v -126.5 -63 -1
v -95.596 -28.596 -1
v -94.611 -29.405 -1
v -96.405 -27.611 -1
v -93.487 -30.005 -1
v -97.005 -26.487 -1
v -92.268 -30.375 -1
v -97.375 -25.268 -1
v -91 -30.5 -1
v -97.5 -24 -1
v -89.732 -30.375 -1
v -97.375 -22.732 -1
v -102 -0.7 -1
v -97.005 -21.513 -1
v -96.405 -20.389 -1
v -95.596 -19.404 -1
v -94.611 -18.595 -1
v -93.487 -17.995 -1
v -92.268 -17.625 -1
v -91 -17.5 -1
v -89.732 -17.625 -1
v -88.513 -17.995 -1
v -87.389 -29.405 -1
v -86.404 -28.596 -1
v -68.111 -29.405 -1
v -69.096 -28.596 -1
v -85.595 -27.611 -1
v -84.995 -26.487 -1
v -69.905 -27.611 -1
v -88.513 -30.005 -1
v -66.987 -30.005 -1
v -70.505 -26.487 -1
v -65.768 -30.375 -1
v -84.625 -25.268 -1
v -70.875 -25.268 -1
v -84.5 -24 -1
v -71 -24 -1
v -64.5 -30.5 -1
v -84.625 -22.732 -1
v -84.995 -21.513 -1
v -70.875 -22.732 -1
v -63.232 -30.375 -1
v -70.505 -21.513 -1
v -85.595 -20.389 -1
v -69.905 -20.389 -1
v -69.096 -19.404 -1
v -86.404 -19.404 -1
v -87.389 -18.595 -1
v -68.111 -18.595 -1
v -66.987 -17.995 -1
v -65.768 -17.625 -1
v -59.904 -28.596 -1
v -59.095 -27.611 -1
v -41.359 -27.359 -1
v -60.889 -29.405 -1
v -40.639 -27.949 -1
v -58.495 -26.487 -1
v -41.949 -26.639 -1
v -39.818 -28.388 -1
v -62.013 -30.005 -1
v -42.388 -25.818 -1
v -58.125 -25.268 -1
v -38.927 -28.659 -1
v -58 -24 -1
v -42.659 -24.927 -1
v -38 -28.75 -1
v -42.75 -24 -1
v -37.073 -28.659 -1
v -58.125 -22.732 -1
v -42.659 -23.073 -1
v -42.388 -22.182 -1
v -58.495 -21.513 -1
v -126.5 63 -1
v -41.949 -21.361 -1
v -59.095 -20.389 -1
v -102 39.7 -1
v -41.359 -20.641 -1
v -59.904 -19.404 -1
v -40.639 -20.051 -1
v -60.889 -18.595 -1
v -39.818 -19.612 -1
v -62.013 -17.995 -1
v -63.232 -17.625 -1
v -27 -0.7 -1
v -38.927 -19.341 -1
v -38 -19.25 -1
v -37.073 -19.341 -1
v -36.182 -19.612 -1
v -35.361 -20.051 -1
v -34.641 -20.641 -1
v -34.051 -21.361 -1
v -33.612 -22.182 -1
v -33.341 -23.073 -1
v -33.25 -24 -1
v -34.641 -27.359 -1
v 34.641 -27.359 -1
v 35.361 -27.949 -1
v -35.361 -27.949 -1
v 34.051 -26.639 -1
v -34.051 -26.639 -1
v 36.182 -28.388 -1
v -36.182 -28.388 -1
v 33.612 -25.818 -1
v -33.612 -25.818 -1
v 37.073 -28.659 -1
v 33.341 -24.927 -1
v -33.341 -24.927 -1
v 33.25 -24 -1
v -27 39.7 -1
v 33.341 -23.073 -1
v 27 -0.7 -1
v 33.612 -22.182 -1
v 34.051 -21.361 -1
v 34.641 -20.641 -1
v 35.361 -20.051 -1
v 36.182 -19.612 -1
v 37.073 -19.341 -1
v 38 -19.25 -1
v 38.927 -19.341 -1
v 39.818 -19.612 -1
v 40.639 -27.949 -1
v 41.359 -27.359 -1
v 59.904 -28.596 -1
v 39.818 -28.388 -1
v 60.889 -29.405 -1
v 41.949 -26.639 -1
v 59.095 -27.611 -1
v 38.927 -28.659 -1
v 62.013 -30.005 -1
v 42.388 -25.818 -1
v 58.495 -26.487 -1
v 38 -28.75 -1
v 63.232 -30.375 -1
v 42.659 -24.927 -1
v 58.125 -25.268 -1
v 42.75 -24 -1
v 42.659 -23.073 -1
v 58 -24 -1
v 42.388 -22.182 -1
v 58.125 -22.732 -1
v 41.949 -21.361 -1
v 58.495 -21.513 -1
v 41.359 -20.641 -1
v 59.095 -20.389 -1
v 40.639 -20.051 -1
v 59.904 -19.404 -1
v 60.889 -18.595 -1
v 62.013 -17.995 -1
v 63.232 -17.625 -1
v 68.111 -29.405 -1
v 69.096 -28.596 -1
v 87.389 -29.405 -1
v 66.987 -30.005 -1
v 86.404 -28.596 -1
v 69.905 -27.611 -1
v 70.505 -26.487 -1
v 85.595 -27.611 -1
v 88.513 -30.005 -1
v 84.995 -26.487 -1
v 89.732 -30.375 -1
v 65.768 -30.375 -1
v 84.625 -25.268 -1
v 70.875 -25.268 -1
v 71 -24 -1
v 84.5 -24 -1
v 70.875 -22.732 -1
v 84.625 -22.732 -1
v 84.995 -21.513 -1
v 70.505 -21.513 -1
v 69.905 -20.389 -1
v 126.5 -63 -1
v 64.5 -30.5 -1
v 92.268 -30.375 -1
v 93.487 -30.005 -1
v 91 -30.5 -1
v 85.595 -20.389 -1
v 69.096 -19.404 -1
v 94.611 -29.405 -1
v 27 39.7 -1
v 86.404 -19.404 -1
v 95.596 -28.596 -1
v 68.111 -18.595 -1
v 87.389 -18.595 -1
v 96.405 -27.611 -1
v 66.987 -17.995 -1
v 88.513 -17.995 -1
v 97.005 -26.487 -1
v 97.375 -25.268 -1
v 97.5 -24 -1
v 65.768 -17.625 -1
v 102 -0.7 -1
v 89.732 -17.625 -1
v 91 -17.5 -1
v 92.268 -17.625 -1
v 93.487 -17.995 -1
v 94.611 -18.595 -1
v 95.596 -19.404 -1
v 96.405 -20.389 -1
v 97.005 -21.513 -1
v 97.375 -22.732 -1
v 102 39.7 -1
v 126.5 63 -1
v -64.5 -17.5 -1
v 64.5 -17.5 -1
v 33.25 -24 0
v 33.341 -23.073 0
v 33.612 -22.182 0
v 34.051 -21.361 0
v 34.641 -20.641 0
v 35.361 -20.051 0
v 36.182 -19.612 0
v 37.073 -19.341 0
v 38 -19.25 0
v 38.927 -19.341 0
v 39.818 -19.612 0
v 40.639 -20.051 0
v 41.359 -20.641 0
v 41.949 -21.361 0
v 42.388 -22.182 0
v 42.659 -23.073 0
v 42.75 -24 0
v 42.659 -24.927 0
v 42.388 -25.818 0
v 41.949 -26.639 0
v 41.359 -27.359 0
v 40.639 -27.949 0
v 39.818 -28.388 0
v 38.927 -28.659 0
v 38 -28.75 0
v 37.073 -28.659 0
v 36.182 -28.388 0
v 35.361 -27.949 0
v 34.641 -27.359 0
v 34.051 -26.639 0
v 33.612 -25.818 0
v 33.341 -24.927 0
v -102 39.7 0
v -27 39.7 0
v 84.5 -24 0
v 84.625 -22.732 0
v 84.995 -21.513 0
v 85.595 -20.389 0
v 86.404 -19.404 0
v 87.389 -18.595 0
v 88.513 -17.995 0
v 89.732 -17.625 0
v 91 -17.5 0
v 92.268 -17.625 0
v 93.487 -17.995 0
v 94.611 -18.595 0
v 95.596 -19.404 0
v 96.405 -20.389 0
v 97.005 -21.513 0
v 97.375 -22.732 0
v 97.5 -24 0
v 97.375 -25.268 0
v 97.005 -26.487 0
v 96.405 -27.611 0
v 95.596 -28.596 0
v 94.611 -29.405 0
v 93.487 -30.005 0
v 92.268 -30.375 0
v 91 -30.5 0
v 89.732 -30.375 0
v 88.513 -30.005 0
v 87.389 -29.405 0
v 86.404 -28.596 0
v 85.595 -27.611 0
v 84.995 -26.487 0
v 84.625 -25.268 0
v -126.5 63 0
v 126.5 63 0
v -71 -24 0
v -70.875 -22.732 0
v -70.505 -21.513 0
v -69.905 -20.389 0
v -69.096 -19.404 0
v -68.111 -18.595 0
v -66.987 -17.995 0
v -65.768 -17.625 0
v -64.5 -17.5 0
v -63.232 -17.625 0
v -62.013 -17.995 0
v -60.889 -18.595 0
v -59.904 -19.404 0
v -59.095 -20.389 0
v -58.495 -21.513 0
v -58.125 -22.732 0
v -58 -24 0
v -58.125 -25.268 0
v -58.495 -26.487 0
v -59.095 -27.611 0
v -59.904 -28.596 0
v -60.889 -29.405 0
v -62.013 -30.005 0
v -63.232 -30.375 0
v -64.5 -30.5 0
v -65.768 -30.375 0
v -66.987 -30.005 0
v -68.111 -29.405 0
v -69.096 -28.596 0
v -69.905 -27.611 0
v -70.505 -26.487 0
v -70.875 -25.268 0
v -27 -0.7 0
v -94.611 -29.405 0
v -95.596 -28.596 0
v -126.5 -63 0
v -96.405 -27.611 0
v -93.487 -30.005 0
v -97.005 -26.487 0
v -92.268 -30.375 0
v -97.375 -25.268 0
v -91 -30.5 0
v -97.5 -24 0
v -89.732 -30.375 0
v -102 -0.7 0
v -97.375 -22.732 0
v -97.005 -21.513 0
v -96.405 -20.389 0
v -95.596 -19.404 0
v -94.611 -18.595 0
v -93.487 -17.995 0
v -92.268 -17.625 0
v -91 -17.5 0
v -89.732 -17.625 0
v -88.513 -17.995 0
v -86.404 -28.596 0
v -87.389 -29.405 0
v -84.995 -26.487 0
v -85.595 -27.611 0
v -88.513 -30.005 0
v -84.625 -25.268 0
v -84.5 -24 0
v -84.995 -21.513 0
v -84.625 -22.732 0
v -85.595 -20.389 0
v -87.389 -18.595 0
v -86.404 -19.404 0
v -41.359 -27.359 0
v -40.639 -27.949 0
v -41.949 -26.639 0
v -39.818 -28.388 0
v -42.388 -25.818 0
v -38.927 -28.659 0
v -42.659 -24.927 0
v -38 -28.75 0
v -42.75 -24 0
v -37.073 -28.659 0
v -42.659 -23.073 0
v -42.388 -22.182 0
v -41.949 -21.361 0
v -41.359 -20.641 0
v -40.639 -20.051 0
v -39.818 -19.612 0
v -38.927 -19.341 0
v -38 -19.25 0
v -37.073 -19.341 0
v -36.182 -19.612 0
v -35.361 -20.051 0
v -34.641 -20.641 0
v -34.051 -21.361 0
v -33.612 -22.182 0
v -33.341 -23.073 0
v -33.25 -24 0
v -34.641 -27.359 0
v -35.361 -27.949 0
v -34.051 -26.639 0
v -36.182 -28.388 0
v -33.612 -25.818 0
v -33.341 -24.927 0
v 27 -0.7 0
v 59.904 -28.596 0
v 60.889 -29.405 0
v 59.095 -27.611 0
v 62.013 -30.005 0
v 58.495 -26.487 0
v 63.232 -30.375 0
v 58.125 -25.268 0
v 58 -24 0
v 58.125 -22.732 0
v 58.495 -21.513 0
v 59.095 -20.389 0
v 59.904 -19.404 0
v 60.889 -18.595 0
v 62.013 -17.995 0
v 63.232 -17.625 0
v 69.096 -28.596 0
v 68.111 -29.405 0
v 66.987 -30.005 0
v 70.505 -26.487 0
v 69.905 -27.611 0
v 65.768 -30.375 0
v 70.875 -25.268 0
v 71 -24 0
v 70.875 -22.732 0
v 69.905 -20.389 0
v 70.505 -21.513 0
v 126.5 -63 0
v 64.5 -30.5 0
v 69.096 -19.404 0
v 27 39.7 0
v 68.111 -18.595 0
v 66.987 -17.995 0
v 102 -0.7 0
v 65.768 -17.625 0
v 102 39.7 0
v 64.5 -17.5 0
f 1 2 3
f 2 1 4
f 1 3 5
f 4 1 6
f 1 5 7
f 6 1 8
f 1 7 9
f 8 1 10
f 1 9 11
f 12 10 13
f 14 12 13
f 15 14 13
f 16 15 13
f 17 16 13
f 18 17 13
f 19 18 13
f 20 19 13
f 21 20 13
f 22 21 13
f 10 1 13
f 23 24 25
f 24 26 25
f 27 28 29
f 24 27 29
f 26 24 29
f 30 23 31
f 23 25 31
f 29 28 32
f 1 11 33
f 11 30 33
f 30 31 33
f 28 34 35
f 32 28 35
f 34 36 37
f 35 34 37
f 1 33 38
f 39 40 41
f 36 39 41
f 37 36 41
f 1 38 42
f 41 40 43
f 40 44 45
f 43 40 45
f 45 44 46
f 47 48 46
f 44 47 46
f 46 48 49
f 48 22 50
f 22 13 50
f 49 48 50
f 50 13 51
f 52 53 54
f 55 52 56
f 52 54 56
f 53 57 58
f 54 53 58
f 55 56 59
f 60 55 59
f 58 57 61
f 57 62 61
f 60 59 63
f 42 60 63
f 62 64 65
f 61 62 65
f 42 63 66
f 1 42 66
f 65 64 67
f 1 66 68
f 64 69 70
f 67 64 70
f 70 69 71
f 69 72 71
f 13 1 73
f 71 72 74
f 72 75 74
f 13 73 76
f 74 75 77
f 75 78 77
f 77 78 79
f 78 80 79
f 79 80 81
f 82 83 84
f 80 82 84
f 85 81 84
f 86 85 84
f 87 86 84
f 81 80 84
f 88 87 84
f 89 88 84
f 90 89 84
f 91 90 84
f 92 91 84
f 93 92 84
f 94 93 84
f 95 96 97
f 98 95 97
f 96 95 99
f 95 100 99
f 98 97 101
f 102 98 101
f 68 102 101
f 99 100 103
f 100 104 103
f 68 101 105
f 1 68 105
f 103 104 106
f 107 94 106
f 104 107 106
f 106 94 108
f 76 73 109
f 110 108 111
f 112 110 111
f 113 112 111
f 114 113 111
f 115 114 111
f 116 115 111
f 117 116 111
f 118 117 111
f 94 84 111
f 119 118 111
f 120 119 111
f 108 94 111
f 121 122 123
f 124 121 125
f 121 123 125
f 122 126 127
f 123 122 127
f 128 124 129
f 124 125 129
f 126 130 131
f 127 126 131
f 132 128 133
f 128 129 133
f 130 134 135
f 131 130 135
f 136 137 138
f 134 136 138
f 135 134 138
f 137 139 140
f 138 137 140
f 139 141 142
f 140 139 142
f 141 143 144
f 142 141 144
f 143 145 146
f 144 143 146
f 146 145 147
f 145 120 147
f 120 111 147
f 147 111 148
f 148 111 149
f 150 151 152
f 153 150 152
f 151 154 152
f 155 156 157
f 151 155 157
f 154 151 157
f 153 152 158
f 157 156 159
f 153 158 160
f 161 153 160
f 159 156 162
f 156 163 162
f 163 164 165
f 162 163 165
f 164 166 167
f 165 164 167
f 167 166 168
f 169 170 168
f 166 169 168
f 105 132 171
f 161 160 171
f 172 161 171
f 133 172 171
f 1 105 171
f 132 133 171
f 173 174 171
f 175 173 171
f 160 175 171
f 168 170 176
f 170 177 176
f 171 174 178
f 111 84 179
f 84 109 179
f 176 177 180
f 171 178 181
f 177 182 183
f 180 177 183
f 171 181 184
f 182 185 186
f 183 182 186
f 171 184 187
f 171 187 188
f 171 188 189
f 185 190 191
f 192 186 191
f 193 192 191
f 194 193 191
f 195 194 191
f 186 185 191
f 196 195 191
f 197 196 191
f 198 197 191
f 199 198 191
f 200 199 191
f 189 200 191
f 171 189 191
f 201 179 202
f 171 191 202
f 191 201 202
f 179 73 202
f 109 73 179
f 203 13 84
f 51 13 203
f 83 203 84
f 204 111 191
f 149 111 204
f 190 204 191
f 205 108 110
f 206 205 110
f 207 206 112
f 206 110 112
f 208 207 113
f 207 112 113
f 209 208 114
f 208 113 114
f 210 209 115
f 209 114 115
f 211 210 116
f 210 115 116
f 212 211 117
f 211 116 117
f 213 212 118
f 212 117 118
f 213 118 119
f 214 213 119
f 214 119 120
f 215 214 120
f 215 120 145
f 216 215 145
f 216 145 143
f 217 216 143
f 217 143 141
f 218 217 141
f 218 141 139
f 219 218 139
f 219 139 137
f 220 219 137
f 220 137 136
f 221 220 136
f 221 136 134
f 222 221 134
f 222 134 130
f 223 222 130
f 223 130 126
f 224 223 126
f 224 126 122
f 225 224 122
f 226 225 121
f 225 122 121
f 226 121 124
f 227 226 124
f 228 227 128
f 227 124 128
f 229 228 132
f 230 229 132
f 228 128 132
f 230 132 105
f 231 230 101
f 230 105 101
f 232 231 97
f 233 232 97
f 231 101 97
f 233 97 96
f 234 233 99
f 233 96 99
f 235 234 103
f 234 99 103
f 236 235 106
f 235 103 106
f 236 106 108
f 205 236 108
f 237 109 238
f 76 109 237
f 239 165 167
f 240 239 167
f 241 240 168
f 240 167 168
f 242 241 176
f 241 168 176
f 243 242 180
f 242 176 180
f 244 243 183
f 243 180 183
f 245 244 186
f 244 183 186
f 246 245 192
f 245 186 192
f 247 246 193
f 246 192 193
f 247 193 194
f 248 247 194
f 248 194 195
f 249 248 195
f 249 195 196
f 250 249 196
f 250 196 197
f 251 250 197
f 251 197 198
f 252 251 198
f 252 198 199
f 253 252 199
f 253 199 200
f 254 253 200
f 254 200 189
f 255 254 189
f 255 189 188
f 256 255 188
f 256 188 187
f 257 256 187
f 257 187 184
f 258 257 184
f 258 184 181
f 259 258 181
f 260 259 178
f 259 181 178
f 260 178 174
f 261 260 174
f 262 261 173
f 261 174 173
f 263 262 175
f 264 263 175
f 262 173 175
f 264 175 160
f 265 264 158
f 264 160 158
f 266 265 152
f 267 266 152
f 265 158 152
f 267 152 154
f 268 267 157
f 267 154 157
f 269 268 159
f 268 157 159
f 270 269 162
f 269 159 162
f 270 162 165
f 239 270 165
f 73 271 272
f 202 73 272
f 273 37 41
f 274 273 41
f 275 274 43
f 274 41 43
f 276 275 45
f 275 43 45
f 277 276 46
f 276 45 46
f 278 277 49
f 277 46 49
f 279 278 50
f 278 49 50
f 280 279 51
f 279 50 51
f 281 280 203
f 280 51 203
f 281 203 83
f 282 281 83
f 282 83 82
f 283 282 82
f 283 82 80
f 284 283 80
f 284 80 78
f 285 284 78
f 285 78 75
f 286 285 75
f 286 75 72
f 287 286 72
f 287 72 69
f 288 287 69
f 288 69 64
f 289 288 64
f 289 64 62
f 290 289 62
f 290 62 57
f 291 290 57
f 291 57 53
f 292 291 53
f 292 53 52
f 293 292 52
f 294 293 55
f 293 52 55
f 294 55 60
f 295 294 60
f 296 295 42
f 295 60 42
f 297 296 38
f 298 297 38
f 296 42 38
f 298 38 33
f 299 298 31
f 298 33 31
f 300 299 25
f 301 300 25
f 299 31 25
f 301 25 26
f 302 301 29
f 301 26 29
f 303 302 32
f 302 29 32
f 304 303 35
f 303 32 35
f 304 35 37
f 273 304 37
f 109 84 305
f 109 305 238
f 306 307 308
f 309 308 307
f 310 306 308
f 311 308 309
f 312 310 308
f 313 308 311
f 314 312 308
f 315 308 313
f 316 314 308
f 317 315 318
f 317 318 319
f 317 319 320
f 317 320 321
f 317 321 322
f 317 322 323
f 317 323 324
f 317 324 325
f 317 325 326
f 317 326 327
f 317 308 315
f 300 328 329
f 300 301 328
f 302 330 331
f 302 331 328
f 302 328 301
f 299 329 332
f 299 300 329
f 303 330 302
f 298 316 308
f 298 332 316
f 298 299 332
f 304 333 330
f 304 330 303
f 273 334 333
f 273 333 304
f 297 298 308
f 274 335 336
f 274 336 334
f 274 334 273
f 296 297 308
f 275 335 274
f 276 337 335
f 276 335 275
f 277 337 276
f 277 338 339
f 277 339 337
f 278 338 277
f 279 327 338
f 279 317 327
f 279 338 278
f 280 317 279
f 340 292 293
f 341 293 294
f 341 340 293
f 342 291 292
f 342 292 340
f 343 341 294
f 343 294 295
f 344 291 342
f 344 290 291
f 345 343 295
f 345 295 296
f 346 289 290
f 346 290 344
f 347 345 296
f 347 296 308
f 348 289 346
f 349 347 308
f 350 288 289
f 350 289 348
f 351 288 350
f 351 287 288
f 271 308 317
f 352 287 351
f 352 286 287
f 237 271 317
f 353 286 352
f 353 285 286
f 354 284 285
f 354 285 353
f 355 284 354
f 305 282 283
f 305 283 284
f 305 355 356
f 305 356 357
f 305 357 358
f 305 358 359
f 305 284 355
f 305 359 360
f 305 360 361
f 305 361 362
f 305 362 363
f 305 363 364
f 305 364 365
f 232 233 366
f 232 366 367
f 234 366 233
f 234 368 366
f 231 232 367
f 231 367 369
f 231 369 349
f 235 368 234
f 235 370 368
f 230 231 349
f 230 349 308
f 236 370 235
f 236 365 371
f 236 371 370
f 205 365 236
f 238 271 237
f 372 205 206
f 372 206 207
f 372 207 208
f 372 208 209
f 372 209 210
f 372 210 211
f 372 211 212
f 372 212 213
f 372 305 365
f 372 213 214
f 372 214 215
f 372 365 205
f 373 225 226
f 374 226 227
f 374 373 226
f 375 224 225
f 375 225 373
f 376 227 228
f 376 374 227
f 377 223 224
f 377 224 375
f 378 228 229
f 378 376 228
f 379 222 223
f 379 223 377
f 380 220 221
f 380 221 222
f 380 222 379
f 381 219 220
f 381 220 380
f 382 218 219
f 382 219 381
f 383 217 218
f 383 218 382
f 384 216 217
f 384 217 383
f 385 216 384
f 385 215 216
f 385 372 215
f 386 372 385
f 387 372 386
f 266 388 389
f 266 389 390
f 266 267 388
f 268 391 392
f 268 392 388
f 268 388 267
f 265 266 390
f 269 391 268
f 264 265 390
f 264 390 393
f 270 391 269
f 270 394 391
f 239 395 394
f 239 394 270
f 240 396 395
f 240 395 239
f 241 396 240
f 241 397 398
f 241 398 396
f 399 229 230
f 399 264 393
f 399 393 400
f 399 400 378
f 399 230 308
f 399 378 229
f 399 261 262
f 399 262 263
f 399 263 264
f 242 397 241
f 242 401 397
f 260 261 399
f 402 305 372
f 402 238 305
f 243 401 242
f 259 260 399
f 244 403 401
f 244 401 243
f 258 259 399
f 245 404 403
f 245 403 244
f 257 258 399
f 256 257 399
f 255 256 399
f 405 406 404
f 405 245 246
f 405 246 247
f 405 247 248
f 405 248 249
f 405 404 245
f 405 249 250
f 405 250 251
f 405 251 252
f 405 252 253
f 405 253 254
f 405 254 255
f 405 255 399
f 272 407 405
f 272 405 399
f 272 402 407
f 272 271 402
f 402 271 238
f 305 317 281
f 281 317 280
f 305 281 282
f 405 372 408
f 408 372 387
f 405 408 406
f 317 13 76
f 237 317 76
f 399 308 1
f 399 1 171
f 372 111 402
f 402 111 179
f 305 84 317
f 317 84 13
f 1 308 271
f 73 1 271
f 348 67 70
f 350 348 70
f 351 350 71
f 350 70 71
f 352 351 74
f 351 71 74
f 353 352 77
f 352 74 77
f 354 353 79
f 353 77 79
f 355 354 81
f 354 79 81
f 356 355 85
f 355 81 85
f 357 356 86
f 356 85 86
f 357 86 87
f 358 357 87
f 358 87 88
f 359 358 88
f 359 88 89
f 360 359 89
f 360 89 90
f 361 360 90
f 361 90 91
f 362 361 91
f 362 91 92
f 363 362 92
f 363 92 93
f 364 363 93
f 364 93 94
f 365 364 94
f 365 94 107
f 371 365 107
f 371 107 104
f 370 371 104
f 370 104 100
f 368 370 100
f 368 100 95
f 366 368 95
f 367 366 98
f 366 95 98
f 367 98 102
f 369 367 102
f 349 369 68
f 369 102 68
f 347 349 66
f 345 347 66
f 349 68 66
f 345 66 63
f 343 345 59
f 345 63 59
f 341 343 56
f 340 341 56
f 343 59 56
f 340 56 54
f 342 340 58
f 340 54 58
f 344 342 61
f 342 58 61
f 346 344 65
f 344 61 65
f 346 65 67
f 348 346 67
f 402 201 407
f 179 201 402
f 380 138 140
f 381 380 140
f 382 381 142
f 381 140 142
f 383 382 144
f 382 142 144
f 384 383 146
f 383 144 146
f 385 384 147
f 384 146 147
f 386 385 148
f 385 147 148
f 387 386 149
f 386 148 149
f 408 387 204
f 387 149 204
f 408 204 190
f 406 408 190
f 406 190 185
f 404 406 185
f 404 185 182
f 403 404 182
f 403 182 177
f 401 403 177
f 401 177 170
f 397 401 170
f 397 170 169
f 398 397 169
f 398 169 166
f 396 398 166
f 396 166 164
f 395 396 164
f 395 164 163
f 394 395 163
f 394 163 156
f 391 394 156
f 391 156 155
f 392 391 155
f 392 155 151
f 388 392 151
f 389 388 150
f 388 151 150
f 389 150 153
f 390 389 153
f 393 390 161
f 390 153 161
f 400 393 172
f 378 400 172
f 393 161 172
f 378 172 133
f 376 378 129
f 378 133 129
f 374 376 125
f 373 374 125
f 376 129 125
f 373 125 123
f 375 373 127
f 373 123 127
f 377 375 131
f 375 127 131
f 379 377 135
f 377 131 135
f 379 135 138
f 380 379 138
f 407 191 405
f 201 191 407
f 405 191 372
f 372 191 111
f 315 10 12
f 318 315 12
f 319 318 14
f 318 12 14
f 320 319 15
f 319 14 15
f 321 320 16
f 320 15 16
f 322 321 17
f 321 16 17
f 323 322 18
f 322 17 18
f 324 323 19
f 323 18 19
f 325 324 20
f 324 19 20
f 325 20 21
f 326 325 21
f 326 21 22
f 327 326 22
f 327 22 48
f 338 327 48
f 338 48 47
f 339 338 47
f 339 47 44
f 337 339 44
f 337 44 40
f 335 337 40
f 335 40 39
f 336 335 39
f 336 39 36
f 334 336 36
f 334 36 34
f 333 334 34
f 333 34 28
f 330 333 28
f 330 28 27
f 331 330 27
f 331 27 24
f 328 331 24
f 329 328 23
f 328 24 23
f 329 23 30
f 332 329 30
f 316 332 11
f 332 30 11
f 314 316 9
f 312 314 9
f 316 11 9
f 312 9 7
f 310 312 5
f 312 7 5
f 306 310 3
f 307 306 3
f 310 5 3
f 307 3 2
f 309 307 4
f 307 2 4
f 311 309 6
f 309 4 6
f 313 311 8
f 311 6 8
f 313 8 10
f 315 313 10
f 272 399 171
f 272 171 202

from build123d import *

# Parameters (mm, degrees)
SKETCH1_W          = 253
SKETCH1_H          = 126
BASE_FLANGE1_DEPTH = 1
SKETCH2_R          = 6.5
SKETCH2_R_2        = 4.75
SKETCH2_W          = 75
SKETCH2_H          = 40.400000001
SKETCH2_H_2        = 40.4
CUT_EXTRUDE1_DEPTH = 10


# Sheet-metal steps are written as plain solids
with BuildPart() as part:
    # Sketch1 → Base-Flange1 (new body)
    with BuildSketch(Plane.XY):
        Rectangle(SKETCH1_W, SKETCH1_H)
    extrude(amount=-BASE_FLANGE1_DEPTH)

    # Sketch2 → Cut-Extrude1 (cut)
    with BuildSketch(Plane(origin=(0, 0, -1), x_dir=(-1, 0, 0), z_dir=(0, 0, -1))):
        with Locations((-91, -24)):
            Circle(SKETCH2_R)
        with Locations((-64.5, -24)):
            Circle(SKETCH2_R)
        with Locations((64.5, -24)):
            Circle(SKETCH2_R)
        with Locations((91, -24)):
            Circle(SKETCH2_R)
        with Locations((-38, -24)):
            Circle(SKETCH2_R_2)
        with Locations((38, -24)):
            Circle(SKETCH2_R_2)
        with Locations((-64.5, 19.5)):
            Rectangle(SKETCH2_W, SKETCH2_H)
        with Locations((64.5, 19.5)):
            Rectangle(SKETCH2_W, SKETCH2_H_2)
    extrude(amount=-CUT_EXTRUDE1_DEPTH, mode=Mode.SUBTRACT)


solid = part.part
